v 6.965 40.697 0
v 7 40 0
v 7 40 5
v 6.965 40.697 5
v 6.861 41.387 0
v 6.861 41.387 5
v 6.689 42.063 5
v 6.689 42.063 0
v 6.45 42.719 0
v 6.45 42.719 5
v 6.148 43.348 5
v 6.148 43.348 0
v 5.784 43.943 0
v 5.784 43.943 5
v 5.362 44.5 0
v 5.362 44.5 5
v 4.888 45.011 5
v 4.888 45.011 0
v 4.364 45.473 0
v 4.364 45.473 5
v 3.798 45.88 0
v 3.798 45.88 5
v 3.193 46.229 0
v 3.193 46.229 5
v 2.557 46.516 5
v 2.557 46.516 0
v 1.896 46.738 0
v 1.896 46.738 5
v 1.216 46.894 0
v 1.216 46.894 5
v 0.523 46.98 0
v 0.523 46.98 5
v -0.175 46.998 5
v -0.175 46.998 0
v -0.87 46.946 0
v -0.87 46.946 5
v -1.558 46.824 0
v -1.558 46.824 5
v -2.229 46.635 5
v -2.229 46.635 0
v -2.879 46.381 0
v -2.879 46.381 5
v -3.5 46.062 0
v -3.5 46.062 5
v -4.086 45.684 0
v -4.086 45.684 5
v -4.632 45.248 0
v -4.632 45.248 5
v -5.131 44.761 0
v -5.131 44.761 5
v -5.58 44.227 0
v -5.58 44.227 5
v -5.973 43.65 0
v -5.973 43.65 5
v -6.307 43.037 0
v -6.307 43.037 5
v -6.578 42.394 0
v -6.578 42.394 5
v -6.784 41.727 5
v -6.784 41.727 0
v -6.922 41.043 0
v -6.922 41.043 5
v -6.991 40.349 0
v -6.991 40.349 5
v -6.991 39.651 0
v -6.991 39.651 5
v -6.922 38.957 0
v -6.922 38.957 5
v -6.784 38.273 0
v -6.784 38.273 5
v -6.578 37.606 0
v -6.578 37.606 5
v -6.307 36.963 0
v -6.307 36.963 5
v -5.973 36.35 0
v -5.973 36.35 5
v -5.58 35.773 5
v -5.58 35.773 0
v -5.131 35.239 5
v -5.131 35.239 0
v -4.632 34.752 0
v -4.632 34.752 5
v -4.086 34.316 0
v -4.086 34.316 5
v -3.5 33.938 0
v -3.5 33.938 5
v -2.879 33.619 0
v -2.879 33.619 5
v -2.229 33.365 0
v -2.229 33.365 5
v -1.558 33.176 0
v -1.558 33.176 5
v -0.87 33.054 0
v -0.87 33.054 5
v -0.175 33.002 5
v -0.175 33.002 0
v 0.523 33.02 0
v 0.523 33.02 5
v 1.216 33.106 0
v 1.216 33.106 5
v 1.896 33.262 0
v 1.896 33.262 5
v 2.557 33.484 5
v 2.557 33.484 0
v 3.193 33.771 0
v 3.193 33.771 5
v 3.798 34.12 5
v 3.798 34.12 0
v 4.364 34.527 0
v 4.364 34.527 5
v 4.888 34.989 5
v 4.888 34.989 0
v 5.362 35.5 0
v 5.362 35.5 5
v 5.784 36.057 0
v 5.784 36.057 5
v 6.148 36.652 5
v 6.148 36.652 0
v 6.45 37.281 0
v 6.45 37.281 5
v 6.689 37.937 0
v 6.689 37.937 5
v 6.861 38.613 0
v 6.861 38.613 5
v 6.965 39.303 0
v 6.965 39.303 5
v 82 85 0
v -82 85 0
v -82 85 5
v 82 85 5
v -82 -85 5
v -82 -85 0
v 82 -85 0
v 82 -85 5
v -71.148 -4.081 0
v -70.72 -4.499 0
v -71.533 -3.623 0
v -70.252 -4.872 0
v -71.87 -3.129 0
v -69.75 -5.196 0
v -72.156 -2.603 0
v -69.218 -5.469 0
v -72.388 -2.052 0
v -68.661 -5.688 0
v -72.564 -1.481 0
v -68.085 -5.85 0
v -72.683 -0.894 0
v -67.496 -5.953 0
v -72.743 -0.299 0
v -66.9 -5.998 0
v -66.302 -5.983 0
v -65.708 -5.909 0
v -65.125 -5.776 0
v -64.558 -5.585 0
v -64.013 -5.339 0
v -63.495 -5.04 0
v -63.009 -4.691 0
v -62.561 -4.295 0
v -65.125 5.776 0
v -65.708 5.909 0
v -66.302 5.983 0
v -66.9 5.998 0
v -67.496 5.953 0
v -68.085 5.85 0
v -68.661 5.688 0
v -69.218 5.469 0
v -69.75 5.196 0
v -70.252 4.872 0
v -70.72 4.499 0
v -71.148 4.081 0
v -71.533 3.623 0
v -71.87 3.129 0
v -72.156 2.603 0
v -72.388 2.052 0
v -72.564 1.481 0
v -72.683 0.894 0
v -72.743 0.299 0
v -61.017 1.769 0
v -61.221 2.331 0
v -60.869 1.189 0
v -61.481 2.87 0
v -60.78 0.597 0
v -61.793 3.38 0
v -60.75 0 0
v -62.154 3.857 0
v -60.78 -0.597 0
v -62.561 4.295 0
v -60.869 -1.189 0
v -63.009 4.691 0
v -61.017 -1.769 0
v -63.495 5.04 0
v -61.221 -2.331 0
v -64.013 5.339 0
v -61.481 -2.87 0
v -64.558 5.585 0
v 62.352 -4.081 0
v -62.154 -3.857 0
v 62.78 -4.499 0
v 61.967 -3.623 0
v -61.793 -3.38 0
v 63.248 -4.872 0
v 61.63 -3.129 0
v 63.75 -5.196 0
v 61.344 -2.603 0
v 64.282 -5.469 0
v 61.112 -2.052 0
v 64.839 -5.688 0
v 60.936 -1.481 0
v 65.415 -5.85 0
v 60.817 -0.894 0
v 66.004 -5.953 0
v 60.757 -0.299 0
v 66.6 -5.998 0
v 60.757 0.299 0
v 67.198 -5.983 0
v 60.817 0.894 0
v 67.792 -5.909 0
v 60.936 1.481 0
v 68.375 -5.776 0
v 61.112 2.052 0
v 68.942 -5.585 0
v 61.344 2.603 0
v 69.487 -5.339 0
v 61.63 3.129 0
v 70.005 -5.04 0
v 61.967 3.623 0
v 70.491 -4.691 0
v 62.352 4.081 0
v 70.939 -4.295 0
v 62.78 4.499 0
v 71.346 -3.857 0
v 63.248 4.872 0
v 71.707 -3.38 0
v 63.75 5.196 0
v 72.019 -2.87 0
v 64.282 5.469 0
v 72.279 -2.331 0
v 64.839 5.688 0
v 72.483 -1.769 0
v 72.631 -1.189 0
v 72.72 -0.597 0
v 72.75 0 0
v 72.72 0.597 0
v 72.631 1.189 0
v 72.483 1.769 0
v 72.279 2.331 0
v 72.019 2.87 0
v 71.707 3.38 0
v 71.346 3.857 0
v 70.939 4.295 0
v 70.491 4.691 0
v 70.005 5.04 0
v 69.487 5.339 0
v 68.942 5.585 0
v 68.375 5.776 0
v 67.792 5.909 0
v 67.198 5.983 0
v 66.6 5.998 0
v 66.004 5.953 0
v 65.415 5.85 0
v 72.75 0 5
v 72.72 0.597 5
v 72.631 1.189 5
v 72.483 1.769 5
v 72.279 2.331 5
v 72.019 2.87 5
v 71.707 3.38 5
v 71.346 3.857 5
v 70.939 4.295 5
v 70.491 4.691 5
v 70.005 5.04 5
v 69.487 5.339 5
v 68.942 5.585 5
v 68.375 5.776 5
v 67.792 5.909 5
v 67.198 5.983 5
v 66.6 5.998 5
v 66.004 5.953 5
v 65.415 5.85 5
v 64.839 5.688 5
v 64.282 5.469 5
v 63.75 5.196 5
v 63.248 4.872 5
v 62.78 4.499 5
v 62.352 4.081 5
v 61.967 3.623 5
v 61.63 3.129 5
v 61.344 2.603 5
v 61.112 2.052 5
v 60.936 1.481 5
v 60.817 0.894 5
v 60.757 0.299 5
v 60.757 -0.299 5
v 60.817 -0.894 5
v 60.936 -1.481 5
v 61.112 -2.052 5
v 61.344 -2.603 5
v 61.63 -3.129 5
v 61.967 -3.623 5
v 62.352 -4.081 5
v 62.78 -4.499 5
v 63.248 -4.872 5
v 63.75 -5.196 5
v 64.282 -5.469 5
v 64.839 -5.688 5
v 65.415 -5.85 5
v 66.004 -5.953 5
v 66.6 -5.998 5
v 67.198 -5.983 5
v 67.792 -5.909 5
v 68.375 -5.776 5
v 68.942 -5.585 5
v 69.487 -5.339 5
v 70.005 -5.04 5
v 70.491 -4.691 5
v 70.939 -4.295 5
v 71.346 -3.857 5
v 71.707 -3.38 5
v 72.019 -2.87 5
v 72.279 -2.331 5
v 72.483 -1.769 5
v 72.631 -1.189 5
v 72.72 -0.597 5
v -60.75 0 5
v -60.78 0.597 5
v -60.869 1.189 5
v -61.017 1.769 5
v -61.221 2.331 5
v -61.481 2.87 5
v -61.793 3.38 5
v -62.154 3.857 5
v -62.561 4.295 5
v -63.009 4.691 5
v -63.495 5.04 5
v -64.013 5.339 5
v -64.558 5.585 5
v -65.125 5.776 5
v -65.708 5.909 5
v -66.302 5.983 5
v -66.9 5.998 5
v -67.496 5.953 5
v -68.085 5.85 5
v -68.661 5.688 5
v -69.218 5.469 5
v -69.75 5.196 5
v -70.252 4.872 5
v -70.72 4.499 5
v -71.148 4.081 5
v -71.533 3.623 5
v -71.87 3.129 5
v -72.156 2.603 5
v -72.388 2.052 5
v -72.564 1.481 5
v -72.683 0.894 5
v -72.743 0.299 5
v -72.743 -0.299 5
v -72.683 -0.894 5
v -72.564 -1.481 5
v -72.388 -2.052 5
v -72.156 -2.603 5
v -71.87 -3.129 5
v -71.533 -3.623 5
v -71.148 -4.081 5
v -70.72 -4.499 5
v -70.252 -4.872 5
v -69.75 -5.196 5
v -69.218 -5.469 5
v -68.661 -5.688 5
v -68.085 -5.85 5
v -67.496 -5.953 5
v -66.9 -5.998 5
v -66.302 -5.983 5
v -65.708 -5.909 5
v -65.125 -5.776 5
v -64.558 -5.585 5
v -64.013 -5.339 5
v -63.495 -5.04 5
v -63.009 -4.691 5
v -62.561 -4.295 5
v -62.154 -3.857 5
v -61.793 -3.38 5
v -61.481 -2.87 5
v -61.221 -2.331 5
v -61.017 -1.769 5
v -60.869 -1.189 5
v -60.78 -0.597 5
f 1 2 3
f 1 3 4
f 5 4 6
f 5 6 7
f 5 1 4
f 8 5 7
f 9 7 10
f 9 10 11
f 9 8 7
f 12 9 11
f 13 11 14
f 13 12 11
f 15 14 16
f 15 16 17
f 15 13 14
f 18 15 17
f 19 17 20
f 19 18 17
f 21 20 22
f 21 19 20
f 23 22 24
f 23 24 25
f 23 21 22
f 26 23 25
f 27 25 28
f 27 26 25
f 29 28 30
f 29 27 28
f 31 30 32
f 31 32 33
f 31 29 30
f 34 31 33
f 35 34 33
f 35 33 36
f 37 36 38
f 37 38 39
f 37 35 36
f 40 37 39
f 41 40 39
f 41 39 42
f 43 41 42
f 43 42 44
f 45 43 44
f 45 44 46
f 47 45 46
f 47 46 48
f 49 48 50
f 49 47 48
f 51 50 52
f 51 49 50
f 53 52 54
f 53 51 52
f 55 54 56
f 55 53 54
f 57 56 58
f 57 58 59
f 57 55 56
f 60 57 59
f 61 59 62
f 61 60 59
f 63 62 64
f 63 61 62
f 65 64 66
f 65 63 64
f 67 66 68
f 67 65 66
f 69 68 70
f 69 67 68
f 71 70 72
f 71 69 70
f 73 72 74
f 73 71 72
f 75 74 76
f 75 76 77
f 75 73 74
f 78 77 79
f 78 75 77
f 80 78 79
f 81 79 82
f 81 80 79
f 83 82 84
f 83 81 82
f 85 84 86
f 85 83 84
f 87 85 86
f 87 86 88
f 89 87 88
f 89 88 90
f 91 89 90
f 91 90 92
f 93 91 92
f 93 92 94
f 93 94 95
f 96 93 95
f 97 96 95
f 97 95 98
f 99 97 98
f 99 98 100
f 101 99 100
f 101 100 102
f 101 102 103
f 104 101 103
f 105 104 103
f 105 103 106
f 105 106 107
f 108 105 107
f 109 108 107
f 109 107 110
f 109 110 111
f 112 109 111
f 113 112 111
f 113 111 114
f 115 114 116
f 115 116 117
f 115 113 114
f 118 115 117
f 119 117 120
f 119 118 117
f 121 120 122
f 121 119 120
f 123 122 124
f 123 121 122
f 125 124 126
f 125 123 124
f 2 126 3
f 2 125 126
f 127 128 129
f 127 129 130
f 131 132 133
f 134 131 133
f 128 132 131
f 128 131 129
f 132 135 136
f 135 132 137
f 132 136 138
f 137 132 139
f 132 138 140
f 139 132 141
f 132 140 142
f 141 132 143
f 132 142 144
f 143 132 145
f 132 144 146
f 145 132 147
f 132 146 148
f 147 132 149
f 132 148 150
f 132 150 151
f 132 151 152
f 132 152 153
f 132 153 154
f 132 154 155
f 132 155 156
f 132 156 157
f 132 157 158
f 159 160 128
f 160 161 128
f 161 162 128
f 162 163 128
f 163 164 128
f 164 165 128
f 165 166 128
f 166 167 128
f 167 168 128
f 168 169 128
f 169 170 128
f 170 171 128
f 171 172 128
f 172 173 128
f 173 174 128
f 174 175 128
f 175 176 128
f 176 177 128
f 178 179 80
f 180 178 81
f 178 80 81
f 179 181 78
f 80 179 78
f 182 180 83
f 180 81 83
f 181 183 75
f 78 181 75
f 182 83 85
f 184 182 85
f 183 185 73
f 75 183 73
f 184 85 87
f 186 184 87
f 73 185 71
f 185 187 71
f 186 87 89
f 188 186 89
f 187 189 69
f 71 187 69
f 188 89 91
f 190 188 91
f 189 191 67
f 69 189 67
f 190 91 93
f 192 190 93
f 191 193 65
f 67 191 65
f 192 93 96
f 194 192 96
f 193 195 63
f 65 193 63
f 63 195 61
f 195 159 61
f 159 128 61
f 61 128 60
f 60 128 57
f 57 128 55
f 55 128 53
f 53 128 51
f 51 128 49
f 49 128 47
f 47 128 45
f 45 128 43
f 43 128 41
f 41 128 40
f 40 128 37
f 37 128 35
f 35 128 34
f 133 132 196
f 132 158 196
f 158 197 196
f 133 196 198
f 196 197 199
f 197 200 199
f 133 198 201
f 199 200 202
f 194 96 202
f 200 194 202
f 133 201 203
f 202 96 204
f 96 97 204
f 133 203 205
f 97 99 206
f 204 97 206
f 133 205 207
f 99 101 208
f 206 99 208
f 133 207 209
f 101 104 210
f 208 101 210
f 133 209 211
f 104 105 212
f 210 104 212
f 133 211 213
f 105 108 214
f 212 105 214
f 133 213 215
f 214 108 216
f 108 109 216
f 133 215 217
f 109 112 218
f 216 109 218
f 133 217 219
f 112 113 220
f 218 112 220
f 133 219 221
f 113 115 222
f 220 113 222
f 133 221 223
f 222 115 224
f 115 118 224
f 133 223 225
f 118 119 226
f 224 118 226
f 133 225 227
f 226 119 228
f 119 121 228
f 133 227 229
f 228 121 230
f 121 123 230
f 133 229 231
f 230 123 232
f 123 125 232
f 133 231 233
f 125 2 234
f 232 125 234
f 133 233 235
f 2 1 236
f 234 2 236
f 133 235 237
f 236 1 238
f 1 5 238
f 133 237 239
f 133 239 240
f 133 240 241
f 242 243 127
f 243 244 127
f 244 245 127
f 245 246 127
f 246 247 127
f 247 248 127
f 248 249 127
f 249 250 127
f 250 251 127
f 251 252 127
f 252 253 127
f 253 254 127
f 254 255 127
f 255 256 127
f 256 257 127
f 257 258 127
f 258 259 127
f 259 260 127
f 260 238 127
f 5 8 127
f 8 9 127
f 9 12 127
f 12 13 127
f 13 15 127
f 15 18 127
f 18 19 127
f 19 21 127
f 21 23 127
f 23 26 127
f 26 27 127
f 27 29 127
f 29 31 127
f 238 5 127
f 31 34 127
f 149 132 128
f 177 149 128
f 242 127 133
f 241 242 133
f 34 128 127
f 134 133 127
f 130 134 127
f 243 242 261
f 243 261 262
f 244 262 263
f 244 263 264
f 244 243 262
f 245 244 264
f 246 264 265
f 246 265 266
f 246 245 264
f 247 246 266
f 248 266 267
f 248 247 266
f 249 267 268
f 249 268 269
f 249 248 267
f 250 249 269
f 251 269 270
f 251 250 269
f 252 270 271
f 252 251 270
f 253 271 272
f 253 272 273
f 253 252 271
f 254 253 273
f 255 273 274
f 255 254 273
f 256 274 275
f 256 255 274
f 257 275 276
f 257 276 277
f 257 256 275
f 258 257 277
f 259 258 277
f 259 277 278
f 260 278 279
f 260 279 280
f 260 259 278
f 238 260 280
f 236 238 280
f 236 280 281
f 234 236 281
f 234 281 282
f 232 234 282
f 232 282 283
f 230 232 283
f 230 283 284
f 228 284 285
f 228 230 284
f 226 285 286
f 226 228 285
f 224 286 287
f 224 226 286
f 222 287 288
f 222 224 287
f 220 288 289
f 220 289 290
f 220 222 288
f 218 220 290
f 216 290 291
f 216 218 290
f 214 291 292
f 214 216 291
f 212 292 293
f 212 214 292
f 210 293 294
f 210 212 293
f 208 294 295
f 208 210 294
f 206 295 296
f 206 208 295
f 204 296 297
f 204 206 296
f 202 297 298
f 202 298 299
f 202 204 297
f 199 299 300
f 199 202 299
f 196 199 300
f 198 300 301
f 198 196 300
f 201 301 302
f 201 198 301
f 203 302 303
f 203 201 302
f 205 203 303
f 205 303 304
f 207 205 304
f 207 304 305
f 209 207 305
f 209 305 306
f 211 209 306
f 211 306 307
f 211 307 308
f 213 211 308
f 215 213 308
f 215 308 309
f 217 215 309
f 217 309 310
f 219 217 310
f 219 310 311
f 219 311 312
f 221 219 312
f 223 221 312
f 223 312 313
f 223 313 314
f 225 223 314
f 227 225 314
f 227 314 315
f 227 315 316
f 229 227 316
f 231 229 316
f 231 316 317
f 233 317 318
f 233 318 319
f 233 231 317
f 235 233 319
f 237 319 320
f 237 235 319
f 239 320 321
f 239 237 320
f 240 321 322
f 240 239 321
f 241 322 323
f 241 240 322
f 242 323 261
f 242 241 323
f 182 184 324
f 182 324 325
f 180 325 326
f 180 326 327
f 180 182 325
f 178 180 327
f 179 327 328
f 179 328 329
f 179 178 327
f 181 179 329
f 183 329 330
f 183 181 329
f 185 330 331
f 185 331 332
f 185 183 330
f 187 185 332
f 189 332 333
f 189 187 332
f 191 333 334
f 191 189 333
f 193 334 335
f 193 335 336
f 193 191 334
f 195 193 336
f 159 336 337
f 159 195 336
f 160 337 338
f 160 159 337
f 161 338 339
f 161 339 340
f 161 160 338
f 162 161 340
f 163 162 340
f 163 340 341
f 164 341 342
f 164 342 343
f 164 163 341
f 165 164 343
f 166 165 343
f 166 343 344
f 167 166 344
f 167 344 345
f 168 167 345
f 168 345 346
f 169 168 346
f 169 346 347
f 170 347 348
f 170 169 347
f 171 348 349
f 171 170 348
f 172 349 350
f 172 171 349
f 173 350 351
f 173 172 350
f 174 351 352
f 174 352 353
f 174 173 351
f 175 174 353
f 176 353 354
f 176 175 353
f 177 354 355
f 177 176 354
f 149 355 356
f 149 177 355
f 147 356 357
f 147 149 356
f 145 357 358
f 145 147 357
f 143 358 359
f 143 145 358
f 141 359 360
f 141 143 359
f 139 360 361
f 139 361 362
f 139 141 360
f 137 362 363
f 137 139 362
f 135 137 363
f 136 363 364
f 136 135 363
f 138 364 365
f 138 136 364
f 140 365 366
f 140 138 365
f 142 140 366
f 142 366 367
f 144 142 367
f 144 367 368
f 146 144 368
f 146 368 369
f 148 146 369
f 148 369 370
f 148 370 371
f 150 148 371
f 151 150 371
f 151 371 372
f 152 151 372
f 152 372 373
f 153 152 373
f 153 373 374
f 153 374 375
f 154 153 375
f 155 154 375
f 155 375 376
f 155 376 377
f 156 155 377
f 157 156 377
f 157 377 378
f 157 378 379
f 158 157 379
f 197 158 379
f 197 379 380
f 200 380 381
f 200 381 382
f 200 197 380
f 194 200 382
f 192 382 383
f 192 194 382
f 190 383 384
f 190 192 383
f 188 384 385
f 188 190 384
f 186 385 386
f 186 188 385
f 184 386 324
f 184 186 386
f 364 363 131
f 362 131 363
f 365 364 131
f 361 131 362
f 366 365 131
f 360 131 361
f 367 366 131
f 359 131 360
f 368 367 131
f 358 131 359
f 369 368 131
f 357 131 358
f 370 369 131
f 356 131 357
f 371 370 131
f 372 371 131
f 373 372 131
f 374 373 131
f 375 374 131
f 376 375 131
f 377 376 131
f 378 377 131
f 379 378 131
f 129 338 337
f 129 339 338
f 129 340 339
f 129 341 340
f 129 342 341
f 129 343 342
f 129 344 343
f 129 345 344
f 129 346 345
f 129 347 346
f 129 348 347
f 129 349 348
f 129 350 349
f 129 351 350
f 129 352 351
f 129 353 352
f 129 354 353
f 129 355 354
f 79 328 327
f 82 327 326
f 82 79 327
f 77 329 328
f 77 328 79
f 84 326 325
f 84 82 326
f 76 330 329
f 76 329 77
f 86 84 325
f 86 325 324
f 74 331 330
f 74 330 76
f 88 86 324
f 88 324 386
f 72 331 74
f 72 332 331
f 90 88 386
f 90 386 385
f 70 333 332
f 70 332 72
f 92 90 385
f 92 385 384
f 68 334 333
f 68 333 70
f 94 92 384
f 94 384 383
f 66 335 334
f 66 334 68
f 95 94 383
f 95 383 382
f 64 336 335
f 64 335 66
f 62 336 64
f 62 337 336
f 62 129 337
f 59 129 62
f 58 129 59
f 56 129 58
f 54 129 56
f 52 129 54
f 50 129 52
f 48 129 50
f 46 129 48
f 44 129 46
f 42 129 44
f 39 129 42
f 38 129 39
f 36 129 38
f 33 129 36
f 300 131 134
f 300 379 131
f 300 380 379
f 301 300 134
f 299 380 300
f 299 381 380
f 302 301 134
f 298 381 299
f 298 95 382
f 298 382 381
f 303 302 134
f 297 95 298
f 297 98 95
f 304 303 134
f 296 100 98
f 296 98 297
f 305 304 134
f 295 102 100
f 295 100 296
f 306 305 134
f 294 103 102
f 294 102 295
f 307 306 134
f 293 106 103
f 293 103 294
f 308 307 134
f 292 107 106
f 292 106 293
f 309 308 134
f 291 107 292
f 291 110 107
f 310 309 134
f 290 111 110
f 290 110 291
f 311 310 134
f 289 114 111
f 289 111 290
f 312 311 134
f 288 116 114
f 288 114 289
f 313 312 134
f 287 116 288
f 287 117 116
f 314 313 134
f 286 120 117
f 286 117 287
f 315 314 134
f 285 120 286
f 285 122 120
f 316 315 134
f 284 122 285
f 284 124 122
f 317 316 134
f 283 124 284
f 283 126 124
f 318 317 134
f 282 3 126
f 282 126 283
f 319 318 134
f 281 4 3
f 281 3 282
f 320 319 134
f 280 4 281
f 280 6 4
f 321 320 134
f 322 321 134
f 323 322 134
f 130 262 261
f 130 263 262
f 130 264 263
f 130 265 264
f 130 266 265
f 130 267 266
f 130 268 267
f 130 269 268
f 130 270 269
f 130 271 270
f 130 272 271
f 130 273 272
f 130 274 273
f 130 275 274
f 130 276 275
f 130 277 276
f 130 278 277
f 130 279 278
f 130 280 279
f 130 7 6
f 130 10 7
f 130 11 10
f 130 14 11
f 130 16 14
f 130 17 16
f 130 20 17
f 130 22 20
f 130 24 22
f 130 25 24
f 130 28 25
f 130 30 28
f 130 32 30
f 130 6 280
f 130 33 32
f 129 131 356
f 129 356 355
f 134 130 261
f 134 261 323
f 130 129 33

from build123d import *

# Parameters (mm, degrees)
F0_W     = 164
F0_H     = 170
F0_R     = 6
F0_R_2   = 7
F1_DEPTH = 5
F2_W     = 20
F2_H     = 5
F3_DEPTH = 0.01


with BuildPart() as f1:
    # F0 (on Top) → F1 (new body)
    with BuildSketch(Plane.XY):
        Rectangle(F0_W, F0_H)
        with Locations((-66.75, 0)):
            Circle(F0_R, mode=Mode.SUBTRACT)
        with Locations((0, 40)):
            Circle(F0_R_2, mode=Mode.SUBTRACT)
        with Locations((66.75, 0)):
            Circle(F0_R, mode=Mode.SUBTRACT)
    extrude(amount=F1_DEPTH)

    # F2 (on face) → F3 (join)
    with BuildSketch(Plane(origin=(0, 85, 0), x_dir=(-1, 0, 0), z_dir=(0, 1, 0))):
        with Locations((72, 2.5)):
            Rectangle(F2_W, F2_H)
        with Locations((-72, 2.5)):
            Rectangle(F2_W, F2_H)
    extrude(amount=-F3_DEPTH)


solid = f1.part
